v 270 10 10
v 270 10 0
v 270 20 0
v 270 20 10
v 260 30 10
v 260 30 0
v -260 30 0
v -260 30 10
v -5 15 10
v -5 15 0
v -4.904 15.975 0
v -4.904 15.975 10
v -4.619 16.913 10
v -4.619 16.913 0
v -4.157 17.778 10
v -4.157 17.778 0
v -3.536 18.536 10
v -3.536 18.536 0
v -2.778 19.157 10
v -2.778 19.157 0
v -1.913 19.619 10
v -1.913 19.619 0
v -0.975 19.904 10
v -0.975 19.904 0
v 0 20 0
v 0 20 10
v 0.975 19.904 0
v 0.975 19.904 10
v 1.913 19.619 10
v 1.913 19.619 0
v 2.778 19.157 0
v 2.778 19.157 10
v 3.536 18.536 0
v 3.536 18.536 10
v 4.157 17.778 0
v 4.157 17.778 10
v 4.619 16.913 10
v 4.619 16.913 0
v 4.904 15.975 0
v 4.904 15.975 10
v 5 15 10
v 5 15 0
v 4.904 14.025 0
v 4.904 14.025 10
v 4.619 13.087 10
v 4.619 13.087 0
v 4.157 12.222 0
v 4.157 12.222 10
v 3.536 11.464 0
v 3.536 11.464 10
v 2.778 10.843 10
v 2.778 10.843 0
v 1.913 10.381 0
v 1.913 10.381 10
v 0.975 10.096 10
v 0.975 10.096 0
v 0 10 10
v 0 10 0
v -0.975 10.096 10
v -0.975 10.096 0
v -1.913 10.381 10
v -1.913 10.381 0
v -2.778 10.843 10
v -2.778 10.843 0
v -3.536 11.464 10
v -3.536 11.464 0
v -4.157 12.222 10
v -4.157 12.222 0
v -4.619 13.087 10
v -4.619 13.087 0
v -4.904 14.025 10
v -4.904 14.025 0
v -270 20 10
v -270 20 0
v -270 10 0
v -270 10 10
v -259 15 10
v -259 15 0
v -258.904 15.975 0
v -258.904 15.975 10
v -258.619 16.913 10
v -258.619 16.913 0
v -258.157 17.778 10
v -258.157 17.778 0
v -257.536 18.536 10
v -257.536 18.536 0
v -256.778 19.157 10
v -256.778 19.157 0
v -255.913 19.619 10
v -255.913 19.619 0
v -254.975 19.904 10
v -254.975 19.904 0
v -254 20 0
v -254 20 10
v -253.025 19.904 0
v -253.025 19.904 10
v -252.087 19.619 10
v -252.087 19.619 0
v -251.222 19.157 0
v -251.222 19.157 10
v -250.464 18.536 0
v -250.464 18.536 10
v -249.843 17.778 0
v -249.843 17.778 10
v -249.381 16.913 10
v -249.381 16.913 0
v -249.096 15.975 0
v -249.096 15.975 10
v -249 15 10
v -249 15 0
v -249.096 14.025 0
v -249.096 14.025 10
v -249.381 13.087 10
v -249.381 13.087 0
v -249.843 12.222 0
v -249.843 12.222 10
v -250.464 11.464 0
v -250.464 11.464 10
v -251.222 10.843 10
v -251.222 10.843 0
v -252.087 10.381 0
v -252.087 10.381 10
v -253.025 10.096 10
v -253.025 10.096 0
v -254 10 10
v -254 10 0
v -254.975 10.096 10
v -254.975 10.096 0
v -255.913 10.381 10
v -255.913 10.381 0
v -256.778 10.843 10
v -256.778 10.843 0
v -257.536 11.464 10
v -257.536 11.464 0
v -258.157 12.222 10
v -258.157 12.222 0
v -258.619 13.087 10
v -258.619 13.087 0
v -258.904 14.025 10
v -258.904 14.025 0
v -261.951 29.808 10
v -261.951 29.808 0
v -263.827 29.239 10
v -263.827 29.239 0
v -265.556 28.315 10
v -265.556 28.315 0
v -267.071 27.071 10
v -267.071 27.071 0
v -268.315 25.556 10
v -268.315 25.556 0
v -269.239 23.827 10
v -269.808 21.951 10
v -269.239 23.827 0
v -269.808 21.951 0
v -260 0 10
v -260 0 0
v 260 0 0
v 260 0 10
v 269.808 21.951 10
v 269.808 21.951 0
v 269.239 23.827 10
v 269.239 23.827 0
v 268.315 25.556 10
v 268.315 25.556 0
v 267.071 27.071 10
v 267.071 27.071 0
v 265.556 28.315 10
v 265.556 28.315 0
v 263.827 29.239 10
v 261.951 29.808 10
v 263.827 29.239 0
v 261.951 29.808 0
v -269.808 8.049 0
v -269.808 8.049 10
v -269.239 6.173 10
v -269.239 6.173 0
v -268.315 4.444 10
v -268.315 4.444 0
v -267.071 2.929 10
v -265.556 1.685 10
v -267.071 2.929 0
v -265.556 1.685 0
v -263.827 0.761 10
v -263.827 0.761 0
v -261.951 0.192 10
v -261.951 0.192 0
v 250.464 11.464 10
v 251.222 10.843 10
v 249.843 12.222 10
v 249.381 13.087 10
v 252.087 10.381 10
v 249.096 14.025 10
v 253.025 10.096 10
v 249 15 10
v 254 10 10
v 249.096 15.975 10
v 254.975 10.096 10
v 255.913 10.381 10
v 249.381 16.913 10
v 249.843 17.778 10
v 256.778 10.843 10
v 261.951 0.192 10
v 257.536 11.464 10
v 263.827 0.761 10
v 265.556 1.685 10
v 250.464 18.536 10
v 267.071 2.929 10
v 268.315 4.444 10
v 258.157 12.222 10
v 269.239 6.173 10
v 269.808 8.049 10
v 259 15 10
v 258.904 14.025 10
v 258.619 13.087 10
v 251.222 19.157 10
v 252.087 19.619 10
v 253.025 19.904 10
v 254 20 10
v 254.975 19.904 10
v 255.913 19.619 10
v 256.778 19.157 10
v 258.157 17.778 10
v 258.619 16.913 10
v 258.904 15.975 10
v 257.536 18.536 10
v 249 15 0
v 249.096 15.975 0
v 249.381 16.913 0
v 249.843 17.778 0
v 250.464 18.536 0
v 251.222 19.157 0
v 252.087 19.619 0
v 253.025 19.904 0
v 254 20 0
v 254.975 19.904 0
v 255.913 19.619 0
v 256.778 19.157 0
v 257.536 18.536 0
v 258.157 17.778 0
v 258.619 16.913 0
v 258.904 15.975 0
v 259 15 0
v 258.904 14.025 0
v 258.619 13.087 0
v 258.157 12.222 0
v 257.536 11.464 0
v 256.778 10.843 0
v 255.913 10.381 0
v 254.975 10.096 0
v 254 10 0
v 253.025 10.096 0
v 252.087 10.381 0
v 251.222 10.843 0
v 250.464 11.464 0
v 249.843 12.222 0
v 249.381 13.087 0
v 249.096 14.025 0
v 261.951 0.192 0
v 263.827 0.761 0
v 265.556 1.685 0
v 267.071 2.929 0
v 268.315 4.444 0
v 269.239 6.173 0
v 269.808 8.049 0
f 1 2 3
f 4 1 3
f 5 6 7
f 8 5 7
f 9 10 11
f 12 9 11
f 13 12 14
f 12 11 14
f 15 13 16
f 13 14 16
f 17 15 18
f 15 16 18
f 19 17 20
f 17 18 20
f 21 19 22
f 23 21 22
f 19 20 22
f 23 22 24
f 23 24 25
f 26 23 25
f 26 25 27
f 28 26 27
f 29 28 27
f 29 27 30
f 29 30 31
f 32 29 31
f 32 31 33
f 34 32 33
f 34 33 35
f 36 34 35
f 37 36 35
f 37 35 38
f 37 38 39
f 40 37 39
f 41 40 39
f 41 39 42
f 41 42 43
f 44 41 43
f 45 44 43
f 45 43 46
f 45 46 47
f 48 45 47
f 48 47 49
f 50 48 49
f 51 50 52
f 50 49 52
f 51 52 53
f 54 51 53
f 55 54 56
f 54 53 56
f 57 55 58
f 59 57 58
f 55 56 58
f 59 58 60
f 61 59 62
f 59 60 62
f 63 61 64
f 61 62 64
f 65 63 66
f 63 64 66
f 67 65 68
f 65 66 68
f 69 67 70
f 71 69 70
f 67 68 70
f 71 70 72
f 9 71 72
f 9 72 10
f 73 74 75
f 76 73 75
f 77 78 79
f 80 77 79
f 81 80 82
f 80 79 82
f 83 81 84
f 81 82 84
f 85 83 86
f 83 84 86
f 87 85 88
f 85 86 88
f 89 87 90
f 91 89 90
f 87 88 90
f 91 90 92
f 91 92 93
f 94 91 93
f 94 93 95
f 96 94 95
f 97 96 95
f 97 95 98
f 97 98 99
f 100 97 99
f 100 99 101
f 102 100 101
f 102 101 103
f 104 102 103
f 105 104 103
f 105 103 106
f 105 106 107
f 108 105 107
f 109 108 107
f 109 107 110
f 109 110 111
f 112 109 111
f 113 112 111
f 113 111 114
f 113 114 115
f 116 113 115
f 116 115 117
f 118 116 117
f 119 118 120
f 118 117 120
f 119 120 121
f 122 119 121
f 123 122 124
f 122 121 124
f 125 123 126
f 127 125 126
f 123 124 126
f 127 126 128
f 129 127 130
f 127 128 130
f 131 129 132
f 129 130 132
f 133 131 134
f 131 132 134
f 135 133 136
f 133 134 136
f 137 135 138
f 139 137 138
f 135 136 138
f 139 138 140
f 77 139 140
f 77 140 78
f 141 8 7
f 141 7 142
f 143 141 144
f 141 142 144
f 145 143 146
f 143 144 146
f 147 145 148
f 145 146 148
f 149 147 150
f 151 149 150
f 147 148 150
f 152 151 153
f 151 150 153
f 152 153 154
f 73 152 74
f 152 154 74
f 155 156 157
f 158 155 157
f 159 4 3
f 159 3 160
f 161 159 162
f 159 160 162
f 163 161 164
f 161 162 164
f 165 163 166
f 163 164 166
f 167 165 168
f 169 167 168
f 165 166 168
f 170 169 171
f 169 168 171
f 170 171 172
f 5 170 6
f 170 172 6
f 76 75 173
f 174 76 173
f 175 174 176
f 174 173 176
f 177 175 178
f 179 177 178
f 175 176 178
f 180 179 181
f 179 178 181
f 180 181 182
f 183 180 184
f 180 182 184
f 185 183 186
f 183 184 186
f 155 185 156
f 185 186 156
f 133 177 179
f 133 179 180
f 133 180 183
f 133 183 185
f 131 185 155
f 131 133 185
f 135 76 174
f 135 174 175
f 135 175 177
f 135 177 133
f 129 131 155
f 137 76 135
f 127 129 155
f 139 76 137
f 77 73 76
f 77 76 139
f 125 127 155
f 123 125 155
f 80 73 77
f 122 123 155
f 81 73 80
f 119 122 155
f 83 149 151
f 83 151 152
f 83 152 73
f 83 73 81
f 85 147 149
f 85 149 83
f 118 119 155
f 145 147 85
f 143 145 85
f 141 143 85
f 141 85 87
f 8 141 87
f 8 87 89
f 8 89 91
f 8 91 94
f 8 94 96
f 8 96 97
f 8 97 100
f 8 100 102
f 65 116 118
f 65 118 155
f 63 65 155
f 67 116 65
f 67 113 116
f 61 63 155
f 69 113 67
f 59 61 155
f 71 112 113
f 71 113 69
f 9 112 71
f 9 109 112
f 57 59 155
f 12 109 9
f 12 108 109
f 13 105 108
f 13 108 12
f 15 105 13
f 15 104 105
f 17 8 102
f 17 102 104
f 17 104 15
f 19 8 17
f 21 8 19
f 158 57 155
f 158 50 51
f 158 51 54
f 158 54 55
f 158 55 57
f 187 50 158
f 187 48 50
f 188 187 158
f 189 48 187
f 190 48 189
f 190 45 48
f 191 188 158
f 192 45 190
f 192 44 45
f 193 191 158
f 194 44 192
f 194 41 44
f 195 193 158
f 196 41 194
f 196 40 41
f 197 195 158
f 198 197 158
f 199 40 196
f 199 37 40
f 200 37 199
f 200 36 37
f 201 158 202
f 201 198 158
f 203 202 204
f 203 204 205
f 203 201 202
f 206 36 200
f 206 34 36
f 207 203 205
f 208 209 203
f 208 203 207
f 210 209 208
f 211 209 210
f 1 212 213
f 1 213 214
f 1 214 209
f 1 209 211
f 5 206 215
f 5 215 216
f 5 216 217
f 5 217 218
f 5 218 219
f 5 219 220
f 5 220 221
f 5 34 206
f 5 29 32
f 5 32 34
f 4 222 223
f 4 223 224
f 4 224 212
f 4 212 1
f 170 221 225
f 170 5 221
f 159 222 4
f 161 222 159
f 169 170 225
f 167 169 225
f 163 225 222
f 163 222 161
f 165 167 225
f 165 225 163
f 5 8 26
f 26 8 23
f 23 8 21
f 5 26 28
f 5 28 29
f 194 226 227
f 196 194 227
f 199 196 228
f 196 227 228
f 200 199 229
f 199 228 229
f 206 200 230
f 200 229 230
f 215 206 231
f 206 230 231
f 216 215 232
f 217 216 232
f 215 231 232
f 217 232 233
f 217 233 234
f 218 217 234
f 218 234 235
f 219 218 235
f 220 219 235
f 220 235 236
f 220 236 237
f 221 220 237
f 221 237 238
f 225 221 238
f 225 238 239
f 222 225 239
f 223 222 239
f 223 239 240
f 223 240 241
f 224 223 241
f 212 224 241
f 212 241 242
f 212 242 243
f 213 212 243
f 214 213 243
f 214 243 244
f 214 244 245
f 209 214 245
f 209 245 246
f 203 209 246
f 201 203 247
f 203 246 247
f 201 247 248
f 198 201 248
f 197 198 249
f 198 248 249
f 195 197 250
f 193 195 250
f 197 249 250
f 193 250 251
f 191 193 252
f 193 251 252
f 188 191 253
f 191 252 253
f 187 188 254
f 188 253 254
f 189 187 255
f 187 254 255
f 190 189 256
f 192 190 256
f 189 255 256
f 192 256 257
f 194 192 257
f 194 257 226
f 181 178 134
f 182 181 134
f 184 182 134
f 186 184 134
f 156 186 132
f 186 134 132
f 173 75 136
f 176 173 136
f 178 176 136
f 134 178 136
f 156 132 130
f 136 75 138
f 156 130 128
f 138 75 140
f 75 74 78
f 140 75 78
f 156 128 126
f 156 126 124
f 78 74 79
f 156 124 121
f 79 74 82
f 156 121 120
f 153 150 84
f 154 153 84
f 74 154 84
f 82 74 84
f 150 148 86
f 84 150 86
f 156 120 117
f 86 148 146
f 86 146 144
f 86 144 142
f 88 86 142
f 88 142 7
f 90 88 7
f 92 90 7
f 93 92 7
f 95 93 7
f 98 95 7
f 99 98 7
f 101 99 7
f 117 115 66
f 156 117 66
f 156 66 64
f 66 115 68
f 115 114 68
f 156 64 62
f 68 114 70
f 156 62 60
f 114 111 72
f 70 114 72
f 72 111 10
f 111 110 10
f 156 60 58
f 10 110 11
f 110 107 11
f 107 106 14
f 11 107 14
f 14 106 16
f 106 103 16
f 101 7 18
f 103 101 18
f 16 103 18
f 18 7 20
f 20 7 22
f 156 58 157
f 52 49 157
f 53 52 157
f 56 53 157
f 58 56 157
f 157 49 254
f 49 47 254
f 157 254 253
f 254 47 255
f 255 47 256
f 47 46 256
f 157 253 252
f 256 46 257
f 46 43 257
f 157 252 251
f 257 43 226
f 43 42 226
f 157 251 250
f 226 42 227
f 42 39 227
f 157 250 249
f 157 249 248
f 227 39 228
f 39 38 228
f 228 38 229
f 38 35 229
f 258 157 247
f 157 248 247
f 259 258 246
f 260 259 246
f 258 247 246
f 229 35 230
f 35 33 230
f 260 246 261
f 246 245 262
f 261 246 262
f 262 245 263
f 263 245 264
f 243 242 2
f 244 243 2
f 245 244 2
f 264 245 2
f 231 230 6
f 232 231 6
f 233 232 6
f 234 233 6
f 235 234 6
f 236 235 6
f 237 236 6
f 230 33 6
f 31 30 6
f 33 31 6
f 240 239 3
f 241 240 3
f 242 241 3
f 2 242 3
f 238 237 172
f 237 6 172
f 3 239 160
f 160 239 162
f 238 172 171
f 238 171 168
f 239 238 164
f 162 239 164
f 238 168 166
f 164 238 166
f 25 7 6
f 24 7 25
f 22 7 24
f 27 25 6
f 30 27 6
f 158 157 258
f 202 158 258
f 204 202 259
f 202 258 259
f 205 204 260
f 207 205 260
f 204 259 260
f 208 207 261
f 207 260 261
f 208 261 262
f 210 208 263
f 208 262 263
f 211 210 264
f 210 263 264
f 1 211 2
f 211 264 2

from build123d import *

# Parameters (mm, degrees)
BOSS_EXTRUDE1_DEPTH = 10
SKETCH3_R           = 5
CUT_EXTRUDE1_DEPTH  = 272.845544381
SKETCH4_R           = 5
CUT_EXTRUDE2_DEPTH  = 272.845544381


with BuildPart() as part:
    # Sketch2 → Boss-Extrude1 (new body)
    with BuildSketch(Plane.XY):
        with BuildLine():
            Line((-260, 0), (260, 0))
            ThreePointArc((260, 0), (267.071067812, 2.928932188), (270, 10))
            Line((270, 10), (270, 20))
            ThreePointArc((270, 20), (267.071067812, 27.071067812), (260, 30))
            Line((260, 30), (-260, 30))
            ThreePointArc((-260, 30), (-267.071067812, 27.071067812), (-270, 20))
            Line((-270, 20), (-270, 10))
            ThreePointArc((-270, 10), (-267.071067812, 2.928932188), (-260, 0))
        make_face()
    extrude(amount=BOSS_EXTRUDE1_DEPTH)

    # Sketch3 → Cut-Extrude1 (cut, through all)
    with BuildSketch(Plane(origin=(0, 0, 0), x_dir=(-1, 0, 0), z_dir=(0, 0, -1))):
        with Locations((254, 15)):
            Circle(SKETCH3_R)
        with Locations((-254, 15)):
            Circle(SKETCH3_R)
    extrude(amount=-CUT_EXTRUDE1_DEPTH, mode=Mode.SUBTRACT)

    # Sketch4 → Cut-Extrude2 (cut, through all)
    with BuildSketch(Plane(origin=(0, 0, 0), x_dir=(-1, 0, 0), z_dir=(0, 0, -1))):
        with Locations((0, 15)):
            Circle(SKETCH4_R)
    extrude(amount=-CUT_EXTRUDE2_DEPTH, mode=Mode.SUBTRACT)


solid = part.part
